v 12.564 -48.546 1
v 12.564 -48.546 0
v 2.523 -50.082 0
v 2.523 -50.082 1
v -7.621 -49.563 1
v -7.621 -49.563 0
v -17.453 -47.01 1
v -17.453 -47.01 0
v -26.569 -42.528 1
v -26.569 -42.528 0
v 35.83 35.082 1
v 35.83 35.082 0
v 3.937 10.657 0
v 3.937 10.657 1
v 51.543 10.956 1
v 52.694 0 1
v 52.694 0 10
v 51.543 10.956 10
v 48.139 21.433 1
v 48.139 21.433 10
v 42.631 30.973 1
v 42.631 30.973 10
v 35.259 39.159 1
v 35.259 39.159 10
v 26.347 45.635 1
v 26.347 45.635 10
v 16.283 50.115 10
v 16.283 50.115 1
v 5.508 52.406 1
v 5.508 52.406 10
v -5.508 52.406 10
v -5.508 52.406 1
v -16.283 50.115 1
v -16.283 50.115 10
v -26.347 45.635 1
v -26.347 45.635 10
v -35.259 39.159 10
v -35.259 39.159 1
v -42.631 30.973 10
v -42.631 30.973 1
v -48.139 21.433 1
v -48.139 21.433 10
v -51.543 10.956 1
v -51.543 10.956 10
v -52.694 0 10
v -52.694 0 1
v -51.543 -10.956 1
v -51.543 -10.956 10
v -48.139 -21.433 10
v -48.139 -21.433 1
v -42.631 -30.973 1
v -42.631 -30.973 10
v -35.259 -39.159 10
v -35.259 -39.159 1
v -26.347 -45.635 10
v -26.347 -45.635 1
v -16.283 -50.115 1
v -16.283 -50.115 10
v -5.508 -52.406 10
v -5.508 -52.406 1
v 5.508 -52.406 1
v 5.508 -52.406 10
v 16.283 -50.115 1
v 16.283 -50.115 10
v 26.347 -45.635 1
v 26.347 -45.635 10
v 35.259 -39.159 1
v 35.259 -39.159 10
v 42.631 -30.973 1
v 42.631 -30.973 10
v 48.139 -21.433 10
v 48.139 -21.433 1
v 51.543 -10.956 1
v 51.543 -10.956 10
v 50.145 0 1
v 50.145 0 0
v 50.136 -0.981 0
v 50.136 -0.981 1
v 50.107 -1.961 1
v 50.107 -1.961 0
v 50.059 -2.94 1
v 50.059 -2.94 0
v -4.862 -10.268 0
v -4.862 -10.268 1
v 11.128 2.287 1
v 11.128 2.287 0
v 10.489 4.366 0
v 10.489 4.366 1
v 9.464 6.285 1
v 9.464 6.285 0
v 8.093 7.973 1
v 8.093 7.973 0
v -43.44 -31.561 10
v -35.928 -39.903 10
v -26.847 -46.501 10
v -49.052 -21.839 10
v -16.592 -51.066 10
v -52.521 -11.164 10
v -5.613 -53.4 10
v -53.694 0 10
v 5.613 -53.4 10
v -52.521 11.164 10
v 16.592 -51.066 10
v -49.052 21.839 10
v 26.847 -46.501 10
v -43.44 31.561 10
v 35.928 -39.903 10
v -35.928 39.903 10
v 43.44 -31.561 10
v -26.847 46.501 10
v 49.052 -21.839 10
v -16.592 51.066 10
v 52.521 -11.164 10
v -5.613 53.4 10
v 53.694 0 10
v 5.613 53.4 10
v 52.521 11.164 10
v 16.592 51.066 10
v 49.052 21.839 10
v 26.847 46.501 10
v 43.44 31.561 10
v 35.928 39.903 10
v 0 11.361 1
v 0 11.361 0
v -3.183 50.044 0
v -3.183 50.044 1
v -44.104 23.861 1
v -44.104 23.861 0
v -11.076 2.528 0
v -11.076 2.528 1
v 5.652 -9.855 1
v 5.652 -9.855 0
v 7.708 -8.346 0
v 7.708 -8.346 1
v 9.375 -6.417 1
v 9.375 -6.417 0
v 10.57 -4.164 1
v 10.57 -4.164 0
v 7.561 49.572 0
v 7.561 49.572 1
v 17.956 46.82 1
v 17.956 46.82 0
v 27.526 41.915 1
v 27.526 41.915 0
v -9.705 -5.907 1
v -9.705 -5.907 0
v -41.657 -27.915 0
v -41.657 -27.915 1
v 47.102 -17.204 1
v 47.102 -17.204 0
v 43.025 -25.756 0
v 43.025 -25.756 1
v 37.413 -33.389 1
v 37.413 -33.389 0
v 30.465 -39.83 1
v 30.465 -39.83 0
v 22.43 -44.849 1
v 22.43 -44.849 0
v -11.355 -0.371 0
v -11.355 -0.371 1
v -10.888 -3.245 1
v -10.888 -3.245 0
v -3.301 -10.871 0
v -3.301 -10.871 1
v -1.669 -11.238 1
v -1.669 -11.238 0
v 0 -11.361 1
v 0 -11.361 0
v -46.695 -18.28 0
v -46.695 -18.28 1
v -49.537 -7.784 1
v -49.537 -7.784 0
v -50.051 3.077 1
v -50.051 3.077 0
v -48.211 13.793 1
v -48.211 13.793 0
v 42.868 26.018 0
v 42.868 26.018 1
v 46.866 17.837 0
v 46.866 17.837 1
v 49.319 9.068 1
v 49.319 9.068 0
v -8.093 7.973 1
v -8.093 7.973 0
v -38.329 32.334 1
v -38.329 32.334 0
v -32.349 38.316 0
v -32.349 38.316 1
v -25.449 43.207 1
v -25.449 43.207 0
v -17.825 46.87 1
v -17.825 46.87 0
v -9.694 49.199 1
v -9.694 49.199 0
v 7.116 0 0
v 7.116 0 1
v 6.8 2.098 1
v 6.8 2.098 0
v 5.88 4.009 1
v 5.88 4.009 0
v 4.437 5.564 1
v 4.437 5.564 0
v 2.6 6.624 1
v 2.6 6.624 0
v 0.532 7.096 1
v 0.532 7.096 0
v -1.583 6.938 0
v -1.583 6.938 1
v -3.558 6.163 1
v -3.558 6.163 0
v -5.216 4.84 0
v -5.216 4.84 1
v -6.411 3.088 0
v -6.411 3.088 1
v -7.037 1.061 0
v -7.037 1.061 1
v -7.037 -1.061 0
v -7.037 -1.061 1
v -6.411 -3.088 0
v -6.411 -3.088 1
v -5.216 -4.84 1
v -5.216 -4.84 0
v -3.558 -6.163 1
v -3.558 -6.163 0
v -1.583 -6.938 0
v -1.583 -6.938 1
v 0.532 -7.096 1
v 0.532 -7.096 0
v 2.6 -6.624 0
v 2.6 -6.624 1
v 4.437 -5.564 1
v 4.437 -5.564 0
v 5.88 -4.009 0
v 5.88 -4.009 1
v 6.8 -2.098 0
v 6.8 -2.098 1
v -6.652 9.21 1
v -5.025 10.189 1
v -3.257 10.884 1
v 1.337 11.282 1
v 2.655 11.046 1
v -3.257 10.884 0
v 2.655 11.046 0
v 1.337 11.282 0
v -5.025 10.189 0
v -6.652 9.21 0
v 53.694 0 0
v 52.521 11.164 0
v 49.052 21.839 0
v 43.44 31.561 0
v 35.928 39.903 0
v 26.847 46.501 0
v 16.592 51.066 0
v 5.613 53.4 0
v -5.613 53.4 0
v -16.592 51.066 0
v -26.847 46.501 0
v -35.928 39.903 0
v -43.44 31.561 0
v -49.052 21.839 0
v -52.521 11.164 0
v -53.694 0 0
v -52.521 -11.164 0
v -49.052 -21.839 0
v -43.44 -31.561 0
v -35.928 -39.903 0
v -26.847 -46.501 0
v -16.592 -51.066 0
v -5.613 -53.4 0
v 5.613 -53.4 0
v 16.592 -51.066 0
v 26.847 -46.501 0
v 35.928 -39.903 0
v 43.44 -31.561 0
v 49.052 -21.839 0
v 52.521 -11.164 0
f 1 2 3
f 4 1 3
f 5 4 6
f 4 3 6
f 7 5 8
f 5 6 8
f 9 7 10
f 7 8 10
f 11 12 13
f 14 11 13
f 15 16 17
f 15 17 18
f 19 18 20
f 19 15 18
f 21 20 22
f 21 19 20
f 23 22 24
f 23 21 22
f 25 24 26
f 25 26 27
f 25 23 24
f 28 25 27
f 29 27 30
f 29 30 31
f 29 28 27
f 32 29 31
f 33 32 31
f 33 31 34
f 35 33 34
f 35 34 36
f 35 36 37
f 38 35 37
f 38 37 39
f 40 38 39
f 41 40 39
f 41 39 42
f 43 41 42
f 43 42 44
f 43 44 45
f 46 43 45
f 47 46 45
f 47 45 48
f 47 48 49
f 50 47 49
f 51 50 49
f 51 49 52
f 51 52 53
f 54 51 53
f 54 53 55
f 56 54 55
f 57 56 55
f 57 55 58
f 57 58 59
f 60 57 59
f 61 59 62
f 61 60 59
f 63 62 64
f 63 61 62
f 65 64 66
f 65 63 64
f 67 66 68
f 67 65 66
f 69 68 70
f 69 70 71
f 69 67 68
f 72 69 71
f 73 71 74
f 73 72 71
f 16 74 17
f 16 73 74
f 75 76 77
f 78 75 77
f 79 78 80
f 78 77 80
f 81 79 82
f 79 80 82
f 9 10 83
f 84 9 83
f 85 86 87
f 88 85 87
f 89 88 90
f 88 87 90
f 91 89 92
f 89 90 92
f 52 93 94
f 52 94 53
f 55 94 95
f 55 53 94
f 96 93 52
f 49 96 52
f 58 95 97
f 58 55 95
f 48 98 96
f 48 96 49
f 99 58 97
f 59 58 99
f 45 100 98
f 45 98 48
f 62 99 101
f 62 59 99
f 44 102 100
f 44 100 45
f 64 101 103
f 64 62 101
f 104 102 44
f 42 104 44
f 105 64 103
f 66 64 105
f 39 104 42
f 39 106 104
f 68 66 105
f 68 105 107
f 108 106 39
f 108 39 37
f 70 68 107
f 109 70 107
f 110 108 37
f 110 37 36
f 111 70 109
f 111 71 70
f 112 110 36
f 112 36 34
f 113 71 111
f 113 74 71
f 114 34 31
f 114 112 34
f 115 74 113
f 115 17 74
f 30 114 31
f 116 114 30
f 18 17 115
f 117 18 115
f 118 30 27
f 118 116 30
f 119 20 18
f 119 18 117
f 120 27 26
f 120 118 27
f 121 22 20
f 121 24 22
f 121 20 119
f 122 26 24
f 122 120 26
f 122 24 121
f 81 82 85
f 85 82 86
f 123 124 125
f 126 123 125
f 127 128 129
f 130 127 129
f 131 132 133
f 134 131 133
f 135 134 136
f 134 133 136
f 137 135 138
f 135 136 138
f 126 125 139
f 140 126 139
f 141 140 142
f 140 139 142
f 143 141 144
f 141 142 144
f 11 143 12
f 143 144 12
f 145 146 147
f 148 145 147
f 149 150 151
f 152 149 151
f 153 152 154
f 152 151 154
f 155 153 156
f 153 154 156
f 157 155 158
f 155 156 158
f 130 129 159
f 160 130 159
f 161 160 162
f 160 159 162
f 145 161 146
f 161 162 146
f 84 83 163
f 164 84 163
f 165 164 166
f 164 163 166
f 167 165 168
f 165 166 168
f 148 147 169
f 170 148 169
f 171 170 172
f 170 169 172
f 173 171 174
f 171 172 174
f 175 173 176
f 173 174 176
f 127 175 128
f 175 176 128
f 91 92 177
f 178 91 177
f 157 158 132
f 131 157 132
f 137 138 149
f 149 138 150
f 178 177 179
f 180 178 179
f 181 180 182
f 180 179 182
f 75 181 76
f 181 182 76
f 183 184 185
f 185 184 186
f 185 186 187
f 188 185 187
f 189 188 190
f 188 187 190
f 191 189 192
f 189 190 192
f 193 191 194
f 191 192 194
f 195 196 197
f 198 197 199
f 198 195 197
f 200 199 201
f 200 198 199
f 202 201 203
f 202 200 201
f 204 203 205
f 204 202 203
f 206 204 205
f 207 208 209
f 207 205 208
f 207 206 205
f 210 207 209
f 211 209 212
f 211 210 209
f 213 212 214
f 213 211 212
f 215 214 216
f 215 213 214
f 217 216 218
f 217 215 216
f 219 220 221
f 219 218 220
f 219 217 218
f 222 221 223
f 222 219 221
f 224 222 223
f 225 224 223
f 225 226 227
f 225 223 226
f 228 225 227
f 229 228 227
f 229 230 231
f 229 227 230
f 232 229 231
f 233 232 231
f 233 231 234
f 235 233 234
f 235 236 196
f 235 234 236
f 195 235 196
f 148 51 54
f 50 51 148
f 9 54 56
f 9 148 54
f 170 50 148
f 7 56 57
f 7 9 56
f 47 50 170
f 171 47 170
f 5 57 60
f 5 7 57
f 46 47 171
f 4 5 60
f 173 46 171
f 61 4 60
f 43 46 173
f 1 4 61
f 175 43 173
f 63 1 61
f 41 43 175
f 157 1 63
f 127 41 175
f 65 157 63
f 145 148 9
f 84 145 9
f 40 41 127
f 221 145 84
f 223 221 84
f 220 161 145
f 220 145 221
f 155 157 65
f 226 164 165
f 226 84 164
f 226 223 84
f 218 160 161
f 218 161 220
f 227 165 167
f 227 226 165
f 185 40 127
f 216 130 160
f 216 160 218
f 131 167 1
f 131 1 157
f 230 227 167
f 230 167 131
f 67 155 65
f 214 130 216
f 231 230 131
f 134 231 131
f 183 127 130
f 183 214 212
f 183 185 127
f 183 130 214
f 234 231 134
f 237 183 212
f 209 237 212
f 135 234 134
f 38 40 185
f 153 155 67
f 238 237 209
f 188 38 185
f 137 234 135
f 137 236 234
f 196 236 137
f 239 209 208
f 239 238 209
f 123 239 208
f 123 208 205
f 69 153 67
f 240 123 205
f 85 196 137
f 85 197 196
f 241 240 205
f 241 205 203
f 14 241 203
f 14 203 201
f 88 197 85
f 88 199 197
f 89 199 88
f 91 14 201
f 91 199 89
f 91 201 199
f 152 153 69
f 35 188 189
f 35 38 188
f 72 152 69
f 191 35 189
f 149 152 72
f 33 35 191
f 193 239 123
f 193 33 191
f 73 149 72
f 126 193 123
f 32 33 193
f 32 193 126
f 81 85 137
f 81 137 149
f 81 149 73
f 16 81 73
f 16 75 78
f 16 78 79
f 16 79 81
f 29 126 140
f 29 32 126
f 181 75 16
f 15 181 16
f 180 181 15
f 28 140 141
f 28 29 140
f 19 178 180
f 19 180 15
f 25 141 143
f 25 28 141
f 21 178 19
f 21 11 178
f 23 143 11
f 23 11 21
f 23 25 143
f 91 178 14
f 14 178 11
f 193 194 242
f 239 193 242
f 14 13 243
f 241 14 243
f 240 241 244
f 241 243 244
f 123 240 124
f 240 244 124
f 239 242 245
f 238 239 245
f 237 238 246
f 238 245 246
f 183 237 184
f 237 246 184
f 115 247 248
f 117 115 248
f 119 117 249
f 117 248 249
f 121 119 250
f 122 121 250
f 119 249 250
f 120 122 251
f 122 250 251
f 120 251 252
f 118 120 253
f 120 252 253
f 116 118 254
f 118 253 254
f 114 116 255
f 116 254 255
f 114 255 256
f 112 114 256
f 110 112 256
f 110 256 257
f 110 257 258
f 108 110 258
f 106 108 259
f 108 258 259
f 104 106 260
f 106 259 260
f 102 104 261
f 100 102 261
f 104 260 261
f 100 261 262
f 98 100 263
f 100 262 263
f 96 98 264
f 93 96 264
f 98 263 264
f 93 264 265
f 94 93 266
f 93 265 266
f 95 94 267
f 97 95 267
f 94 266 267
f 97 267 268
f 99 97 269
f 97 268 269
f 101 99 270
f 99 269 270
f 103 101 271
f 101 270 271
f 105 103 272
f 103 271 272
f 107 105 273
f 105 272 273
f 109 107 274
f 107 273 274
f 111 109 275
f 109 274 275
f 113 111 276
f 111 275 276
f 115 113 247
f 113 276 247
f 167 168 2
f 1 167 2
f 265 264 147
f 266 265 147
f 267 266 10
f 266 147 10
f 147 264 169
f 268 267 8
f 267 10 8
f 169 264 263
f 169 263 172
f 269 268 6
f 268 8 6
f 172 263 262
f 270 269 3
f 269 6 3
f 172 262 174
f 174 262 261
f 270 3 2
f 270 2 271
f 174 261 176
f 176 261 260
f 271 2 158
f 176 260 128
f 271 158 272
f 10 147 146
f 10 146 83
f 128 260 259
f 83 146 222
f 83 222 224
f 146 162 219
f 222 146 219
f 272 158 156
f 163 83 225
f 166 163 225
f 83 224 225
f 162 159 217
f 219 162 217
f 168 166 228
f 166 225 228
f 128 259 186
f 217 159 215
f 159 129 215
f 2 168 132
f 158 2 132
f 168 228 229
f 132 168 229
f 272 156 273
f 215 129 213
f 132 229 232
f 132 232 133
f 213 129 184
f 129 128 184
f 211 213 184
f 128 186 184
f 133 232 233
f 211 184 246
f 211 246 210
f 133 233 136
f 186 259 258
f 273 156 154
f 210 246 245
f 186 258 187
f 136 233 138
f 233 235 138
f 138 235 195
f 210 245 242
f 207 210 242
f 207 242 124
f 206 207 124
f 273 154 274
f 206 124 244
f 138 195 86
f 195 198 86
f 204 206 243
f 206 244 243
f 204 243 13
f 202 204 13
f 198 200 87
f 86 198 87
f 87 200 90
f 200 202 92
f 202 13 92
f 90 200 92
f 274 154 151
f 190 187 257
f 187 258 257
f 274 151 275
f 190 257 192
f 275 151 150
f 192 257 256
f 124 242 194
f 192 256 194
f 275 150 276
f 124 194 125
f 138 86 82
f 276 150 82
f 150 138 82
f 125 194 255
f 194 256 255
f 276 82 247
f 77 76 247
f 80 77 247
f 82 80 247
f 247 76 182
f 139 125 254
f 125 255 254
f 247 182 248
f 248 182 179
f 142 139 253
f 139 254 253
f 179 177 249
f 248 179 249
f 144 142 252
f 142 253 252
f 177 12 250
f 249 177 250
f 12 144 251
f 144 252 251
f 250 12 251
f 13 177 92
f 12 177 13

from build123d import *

# Parameters (mm, degrees)
F4_R      = 53.6942028964
F5_DEPTH  = 10
F6_T      = -1
F11_R     = 7.1329818057
F12_DEPTH = 62.1
F13_R     = 7.1161383354
F14_DEPTH = 79.5
F16_DEPTH = 25


# Not quite as in the source:
# - the program builds the solid bodies; features that only make, move or delete a surface that nothing else refers to are left out


with BuildPart() as f5:
    # F4 (on Top) → F5 (new body)
    with BuildSketch(Plane.XY):
        Circle(F4_R)
    extrude(amount=F5_DEPTH)

    # F6
    f6_openings = [f5.faces().sort_by_distance(p)[0] for p in [
        (0, 0, 10),
    ]]
    offset(amount=F6_T, openings=f6_openings)

    # F11 (on Top) → F12 (cut)
    with BuildSketch(Plane.XY):
        Circle(F11_R)
    extrude(amount=-F12_DEPTH, mode=Mode.SUBTRACT)

    # F13 (on Top) → F14 (cut)
    with BuildSketch(Plane.XY):
        Circle(F13_R)
    extrude(amount=F14_DEPTH, mode=Mode.SUBTRACT)

    # F15 (on face) → F16 (cut)
    with BuildSketch(Plane(origin=(0, 0, 0), x_dir=(1, 0, 0), z_dir=(0, 0, -1))):
        with BuildLine():
            Line((0, 11.3609913542), (12.56390222, 48.5457946048))
            ThreePointArc((12.56390222, 48.5457946048), (-7.6213284004, 49.5626993435), (-26.5685055521, 42.5283473172))
            Line((-26.5685055521, 42.5283473172), (-4.8620371636, 10.2680435901))
            ThreePointArc((-4.8620371636, 10.2680435901), (-2.4916831758, 11.0843871955), (0, 11.3609913542))
        make_face()
        with BuildLine():
            Line((-9.7046168543, 5.9069904572), (-41.6567469595, 27.9152511283))
            ThreePointArc((-41.6567469595, 27.9152511283), (-50.0893104585, 2.3678662526), (-44.1043633563, -23.8610759552))
            Line((-44.1043633563, -23.8610759552), (-11.0760480746, -2.5284943342))
            ThreePointArc((-11.0760480746, -2.5284943342), (-11.2137576056, 1.8231195549), (-9.7046168543, 5.9069904572))
        make_face()
        with BuildLine():
            ThreePointArc((-38.3285737992, -32.3336704276), (-25.4491957444, -43.2074559395), (-9.6943225855, -49.1992471732))
            Line((-9.6943225855, -49.1992471732), (-3.2570755528, -10.8840977298))
            ThreePointArc((-3.2570755528, -10.8840977298), (-5.8587236117, -9.733831835), (-8.0930813532, -7.9733405019))
            Line((-8.0930813532, -7.9733405019), (-38.3285737992, -32.3336704276))
        make_face()
        with BuildLine():
            ThreePointArc((-3.1826565415, -50.0441456131), (17.9564047347, -46.8200100577), (35.8302023129, -35.0819385869))
            Line((35.8302023129, -35.0819385869), (3.9370343752, -10.6570110668))
            ThreePointArc((3.9370343752, -10.6570110668), (1.9997392278, -11.183611562), (0, -11.3609913542))
            Line((0, -11.3609913542), (-3.1826565415, -50.0441456131))
        make_face()
        with BuildLine():
            ThreePointArc((42.8675483184, -26.0176692648), (48.2915604345, -13.5081828387), (50.1452471606, 0))
            ThreePointArc((50.1452471606, 0), (50.1236727364, 1.4707971358), (50.058968028, 2.9403286841))
            Line((50.058968028, 2.9403286841), (11.1284959107, -2.2866358071))
            ThreePointArc((11.1284959107, -2.2866358071), (10.0225700646, -5.3497863368), (8.0930813532, -7.9733405019))
            Line((8.0930813532, -7.9733405019), (42.8675483184, -26.0176692648))
        make_face()
        with BuildLine():
            Line((10.5704846038, 4.1637699011), (47.1017248223, 17.2038754811))
            ThreePointArc((47.1017248223, 17.2038754811), (37.4128970239, 33.3889345305), (22.4298275607, 44.8491766747))
            Line((22.4298275607, 44.8491766747), (5.6516858546, 9.8554843387))
            ThreePointArc((5.6516858546, 9.8554843387), (8.5958482365, 7.4285609403), (10.5704846038, 4.1637699011))
        make_face()
    extrude(amount=-F16_DEPTH, mode=Mode.SUBTRACT)


solid = f5.part
